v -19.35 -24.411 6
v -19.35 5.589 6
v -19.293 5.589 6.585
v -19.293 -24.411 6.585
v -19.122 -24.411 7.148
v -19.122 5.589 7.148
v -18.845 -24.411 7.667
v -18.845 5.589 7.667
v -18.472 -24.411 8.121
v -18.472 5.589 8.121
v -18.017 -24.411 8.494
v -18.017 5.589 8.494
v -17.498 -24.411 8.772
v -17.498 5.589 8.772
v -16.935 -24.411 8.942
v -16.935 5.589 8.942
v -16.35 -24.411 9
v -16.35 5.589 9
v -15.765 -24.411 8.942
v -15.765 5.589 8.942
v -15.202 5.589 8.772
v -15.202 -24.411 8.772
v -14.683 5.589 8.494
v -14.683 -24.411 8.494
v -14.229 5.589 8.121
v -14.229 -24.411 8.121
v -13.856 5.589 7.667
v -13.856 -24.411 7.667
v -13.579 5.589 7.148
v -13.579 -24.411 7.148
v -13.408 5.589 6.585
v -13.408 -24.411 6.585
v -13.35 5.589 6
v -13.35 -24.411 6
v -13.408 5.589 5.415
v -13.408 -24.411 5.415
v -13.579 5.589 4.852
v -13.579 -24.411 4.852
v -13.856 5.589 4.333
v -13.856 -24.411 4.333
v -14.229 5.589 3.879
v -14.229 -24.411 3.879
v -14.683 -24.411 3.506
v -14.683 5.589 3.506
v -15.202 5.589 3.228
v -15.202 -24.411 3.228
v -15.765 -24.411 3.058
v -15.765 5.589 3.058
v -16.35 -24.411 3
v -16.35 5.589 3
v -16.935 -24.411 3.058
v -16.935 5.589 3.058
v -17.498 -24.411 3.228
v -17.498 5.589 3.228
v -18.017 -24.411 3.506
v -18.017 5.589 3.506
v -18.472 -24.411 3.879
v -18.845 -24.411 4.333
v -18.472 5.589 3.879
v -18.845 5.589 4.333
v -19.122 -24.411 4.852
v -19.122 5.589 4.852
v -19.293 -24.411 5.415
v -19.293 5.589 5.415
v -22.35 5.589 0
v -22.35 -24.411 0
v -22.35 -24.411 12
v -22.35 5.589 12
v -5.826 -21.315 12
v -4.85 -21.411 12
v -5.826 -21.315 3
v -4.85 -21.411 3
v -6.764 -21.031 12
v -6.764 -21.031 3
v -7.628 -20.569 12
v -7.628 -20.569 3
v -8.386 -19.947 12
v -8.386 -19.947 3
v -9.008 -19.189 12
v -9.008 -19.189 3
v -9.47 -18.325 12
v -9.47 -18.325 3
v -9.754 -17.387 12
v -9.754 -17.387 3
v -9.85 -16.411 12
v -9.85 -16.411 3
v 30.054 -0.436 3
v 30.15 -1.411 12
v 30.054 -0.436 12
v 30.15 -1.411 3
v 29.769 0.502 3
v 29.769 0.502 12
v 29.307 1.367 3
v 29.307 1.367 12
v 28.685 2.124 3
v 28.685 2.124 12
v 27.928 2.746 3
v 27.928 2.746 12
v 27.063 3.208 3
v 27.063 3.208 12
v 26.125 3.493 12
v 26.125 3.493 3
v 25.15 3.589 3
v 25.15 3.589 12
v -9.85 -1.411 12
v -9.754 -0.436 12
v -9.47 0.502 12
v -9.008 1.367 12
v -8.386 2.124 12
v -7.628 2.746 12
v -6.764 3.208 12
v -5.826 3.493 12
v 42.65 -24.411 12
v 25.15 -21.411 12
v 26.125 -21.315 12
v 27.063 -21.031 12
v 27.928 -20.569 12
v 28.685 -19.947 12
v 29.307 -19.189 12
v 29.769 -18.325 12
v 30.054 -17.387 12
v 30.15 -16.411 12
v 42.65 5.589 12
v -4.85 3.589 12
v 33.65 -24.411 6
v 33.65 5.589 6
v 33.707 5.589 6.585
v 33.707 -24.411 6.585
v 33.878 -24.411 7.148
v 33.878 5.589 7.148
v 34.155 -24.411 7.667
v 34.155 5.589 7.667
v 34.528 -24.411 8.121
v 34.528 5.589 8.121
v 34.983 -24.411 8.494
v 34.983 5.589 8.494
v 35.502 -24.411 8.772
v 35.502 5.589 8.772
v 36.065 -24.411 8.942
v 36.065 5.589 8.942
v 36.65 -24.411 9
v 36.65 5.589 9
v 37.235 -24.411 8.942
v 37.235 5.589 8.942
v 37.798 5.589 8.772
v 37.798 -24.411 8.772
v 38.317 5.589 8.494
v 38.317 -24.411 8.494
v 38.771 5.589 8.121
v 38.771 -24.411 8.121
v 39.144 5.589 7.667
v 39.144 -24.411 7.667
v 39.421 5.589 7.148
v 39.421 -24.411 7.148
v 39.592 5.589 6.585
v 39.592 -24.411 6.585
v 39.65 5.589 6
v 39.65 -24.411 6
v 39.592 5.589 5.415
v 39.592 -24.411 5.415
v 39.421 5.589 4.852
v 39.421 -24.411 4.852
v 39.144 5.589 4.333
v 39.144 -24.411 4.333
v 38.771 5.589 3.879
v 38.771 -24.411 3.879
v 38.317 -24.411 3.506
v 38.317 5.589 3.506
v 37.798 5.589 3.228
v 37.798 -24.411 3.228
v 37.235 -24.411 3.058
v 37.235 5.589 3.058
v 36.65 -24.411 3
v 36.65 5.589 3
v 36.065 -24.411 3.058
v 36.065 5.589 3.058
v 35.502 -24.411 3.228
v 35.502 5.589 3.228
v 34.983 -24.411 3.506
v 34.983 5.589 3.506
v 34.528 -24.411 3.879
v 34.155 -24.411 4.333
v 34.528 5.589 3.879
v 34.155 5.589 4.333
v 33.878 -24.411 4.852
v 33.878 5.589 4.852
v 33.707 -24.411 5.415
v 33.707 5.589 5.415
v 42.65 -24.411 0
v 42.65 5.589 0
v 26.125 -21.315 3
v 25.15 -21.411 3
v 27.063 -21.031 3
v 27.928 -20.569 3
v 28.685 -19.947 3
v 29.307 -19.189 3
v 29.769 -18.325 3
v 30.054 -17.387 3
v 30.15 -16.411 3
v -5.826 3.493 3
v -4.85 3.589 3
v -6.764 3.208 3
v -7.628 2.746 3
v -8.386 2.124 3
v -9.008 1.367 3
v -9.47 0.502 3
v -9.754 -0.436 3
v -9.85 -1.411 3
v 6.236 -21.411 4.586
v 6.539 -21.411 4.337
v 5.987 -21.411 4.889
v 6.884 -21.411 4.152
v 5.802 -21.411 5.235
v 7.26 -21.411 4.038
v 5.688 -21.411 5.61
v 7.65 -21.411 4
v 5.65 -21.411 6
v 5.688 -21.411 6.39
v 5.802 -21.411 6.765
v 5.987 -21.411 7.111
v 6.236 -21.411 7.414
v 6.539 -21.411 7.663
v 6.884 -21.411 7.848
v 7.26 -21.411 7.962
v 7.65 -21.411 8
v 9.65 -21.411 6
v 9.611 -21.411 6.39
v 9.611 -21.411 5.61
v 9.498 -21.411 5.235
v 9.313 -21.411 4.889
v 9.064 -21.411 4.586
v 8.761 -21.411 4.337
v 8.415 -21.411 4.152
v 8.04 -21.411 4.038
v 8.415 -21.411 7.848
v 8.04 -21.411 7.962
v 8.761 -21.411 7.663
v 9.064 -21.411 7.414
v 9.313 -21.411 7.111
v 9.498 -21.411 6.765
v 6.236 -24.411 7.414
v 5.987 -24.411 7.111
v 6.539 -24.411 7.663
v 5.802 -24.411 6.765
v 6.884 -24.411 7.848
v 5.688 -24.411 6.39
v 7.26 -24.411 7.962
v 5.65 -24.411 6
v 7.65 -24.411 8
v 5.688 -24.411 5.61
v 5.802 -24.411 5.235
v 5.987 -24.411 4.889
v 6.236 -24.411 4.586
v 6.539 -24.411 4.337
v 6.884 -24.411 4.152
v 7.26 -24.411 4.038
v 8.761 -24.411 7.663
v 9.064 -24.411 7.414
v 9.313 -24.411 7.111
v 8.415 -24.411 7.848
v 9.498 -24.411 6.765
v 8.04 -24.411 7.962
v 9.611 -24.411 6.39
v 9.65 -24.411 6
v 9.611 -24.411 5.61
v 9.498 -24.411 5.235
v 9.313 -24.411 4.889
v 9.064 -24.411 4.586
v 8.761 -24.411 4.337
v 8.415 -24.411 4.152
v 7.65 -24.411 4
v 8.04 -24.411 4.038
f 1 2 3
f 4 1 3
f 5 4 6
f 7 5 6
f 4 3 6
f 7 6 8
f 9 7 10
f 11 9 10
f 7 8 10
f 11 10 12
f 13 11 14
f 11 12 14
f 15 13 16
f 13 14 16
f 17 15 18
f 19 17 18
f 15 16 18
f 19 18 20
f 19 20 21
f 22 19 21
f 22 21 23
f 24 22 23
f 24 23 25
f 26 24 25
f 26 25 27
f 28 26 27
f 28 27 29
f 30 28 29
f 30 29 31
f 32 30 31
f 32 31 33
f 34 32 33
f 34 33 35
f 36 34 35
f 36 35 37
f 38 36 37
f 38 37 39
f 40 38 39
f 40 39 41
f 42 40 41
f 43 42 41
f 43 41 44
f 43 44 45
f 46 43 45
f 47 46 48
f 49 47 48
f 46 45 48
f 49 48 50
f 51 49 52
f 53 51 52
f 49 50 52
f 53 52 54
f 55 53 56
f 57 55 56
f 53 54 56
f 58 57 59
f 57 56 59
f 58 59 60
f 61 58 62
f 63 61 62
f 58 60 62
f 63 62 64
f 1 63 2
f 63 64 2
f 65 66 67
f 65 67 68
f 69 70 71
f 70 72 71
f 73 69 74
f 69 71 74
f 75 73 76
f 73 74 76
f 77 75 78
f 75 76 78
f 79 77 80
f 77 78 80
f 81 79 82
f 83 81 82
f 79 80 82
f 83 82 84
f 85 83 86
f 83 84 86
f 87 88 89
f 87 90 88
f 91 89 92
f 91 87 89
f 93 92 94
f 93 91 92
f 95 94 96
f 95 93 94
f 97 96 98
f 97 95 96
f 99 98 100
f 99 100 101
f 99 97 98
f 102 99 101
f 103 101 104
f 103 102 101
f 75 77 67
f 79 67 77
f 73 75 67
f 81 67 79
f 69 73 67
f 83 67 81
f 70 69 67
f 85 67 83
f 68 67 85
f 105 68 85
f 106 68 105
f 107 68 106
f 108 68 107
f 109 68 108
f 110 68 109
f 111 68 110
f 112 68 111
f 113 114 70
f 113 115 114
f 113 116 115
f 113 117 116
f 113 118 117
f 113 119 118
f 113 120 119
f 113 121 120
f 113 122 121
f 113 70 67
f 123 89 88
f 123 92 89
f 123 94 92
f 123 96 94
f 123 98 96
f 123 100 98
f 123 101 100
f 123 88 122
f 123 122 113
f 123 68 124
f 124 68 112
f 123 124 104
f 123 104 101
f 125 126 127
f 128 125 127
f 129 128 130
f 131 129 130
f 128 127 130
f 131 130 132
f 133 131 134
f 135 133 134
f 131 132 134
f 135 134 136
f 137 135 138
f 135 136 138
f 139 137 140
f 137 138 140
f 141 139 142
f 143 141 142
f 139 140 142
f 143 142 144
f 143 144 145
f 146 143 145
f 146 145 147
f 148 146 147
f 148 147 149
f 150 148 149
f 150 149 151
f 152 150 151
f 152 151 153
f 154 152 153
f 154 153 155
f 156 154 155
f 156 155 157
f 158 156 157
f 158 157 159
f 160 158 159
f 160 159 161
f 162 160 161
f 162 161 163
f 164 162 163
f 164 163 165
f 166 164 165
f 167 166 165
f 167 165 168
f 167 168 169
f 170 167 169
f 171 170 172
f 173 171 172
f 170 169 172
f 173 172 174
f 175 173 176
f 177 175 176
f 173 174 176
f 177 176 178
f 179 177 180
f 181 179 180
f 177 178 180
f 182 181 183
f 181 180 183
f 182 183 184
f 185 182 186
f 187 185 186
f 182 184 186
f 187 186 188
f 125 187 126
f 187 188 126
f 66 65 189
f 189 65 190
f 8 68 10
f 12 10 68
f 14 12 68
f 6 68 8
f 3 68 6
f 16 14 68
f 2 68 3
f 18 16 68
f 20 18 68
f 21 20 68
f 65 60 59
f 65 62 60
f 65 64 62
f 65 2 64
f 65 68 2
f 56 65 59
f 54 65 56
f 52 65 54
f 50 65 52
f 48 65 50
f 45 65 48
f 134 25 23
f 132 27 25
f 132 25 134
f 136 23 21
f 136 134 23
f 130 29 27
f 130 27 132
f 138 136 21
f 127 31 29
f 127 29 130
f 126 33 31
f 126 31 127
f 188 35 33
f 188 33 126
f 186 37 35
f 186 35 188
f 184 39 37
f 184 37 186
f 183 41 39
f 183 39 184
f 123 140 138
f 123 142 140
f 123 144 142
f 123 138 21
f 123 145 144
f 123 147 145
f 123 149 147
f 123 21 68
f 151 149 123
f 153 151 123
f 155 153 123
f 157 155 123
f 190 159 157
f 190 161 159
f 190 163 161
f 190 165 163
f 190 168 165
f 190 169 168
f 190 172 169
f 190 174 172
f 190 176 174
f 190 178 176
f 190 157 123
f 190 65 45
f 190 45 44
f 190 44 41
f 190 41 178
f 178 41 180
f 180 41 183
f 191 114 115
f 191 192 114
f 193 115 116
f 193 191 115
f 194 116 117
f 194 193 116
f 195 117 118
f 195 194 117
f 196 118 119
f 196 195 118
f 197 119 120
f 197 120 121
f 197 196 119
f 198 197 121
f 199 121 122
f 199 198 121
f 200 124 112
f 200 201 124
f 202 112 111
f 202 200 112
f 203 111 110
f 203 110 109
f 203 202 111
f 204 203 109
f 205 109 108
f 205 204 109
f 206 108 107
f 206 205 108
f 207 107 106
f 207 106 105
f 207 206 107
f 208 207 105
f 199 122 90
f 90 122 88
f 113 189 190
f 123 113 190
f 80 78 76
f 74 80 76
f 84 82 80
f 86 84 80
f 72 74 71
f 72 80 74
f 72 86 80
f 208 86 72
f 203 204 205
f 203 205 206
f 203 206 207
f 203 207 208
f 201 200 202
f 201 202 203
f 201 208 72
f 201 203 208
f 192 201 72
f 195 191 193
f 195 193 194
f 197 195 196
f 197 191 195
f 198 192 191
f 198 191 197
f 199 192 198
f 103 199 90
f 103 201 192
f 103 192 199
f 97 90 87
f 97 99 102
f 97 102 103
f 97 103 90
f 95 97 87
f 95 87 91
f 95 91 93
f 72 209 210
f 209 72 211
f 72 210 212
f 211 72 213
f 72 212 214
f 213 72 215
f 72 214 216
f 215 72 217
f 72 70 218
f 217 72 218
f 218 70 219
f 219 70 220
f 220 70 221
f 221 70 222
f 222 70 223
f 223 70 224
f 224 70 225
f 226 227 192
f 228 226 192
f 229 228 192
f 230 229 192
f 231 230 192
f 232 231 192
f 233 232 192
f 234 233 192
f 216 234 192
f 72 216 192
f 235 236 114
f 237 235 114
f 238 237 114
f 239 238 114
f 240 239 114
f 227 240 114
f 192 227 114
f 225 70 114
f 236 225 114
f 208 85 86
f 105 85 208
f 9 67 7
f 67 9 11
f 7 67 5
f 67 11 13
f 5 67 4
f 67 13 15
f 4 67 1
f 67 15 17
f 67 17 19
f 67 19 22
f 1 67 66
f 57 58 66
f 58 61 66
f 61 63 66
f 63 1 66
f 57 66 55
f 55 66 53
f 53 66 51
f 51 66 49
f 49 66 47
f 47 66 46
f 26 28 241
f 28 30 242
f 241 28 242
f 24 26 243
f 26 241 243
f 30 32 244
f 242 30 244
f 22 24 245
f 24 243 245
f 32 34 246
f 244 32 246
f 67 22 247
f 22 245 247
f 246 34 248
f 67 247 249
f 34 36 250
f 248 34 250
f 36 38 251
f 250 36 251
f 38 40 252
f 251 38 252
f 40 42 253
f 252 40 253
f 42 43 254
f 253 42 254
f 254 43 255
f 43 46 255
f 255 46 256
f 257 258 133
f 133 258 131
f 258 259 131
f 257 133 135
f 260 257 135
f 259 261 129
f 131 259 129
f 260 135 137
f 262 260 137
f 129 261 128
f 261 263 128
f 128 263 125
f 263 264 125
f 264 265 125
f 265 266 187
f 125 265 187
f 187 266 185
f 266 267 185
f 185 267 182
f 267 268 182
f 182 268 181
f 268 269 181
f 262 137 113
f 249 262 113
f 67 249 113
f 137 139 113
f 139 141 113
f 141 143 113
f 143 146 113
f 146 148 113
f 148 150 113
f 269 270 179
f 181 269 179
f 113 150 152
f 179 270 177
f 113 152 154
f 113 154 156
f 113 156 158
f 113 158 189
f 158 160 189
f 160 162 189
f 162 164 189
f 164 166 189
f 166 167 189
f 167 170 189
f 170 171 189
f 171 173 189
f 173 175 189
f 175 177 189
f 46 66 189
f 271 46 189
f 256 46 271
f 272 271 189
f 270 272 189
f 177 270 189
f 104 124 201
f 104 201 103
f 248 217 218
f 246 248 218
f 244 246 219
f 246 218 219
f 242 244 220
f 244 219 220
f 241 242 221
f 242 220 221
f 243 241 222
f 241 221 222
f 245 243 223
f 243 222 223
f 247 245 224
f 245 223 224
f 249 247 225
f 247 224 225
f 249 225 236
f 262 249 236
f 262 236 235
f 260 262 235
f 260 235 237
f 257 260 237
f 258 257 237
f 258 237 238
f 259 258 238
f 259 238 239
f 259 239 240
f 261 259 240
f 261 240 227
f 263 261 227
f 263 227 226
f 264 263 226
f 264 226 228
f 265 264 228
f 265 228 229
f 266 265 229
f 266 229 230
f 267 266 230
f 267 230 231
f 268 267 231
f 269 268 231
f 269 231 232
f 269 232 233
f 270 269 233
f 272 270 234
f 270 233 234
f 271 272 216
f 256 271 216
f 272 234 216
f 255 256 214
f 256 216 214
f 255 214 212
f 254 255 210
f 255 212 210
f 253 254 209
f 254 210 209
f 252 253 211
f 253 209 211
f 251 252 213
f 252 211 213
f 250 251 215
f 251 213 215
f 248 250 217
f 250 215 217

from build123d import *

# Parameters (mm, degrees)
F0_W     = 65
F0_H     = 30
F1_DEPTH = 12
F4_D     = 6
F5_D     = 6
F6_W     = 40
F6_H     = 25
F7_DEPTH = 9
F8_R     = 5
F9_D     = 4
F9_DEPTH = 7
F9_TIP   = 1.2017212381


# Not quite as in the source:
# - a feature names something its author has since deleted; it is built from what else it names


with BuildPart() as f1:
    # F0 (on Top) → F1 (new body)
    with BuildSketch(Plane.XY):
        with Locations((10.1498100485, -9.411229075)):
            Rectangle(F0_W, F0_H)
    extrude(amount=F1_DEPTH)

    # F4 (through all)
    with Locations(Plane.XZ.offset(24.411229075)):
        with Locations((36.6498100485, 6)):
            Hole(F4_D / 2)

    # F5 (through all)
    with Locations(Plane.XZ.offset(24.411229075)):
        with Locations((-16.3501899515, 6)):
            Hole(F5_D / 2)

    # F6 (on face) → F7 (cut)
    with BuildSketch(Plane.XY.offset(12)):
        with Locations((10.1498100485, -8.911229075)):
            Rectangle(F6_W, F6_H)
    extrude(amount=-F7_DEPTH, mode=Mode.SUBTRACT)

    # F8
    f8_edges = [f1.edges().sort_by_distance(p)[0] for p in [
        (-9.85019, 3.588771, 7.5),
        (-9.85019, -21.411229, 7.5),
        (30.14981, 3.588771, 7.5),
        (30.14981, -21.411229, 7.5),
    ]]
    fillet(f8_edges, radius=F8_R)

    # F9
    with Locations(Plane.XZ.offset(24.411229075)):
        with Locations((7.6498100485, 6)):
            Hole(F9_D / 2, depth=F9_DEPTH)
            with Locations((0, 0, -(F9_DEPTH + F9_TIP / 2))):  # 118° drill point
                Cone(0, F9_D / 2, F9_TIP, mode=Mode.SUBTRACT)


solid = f1.part
